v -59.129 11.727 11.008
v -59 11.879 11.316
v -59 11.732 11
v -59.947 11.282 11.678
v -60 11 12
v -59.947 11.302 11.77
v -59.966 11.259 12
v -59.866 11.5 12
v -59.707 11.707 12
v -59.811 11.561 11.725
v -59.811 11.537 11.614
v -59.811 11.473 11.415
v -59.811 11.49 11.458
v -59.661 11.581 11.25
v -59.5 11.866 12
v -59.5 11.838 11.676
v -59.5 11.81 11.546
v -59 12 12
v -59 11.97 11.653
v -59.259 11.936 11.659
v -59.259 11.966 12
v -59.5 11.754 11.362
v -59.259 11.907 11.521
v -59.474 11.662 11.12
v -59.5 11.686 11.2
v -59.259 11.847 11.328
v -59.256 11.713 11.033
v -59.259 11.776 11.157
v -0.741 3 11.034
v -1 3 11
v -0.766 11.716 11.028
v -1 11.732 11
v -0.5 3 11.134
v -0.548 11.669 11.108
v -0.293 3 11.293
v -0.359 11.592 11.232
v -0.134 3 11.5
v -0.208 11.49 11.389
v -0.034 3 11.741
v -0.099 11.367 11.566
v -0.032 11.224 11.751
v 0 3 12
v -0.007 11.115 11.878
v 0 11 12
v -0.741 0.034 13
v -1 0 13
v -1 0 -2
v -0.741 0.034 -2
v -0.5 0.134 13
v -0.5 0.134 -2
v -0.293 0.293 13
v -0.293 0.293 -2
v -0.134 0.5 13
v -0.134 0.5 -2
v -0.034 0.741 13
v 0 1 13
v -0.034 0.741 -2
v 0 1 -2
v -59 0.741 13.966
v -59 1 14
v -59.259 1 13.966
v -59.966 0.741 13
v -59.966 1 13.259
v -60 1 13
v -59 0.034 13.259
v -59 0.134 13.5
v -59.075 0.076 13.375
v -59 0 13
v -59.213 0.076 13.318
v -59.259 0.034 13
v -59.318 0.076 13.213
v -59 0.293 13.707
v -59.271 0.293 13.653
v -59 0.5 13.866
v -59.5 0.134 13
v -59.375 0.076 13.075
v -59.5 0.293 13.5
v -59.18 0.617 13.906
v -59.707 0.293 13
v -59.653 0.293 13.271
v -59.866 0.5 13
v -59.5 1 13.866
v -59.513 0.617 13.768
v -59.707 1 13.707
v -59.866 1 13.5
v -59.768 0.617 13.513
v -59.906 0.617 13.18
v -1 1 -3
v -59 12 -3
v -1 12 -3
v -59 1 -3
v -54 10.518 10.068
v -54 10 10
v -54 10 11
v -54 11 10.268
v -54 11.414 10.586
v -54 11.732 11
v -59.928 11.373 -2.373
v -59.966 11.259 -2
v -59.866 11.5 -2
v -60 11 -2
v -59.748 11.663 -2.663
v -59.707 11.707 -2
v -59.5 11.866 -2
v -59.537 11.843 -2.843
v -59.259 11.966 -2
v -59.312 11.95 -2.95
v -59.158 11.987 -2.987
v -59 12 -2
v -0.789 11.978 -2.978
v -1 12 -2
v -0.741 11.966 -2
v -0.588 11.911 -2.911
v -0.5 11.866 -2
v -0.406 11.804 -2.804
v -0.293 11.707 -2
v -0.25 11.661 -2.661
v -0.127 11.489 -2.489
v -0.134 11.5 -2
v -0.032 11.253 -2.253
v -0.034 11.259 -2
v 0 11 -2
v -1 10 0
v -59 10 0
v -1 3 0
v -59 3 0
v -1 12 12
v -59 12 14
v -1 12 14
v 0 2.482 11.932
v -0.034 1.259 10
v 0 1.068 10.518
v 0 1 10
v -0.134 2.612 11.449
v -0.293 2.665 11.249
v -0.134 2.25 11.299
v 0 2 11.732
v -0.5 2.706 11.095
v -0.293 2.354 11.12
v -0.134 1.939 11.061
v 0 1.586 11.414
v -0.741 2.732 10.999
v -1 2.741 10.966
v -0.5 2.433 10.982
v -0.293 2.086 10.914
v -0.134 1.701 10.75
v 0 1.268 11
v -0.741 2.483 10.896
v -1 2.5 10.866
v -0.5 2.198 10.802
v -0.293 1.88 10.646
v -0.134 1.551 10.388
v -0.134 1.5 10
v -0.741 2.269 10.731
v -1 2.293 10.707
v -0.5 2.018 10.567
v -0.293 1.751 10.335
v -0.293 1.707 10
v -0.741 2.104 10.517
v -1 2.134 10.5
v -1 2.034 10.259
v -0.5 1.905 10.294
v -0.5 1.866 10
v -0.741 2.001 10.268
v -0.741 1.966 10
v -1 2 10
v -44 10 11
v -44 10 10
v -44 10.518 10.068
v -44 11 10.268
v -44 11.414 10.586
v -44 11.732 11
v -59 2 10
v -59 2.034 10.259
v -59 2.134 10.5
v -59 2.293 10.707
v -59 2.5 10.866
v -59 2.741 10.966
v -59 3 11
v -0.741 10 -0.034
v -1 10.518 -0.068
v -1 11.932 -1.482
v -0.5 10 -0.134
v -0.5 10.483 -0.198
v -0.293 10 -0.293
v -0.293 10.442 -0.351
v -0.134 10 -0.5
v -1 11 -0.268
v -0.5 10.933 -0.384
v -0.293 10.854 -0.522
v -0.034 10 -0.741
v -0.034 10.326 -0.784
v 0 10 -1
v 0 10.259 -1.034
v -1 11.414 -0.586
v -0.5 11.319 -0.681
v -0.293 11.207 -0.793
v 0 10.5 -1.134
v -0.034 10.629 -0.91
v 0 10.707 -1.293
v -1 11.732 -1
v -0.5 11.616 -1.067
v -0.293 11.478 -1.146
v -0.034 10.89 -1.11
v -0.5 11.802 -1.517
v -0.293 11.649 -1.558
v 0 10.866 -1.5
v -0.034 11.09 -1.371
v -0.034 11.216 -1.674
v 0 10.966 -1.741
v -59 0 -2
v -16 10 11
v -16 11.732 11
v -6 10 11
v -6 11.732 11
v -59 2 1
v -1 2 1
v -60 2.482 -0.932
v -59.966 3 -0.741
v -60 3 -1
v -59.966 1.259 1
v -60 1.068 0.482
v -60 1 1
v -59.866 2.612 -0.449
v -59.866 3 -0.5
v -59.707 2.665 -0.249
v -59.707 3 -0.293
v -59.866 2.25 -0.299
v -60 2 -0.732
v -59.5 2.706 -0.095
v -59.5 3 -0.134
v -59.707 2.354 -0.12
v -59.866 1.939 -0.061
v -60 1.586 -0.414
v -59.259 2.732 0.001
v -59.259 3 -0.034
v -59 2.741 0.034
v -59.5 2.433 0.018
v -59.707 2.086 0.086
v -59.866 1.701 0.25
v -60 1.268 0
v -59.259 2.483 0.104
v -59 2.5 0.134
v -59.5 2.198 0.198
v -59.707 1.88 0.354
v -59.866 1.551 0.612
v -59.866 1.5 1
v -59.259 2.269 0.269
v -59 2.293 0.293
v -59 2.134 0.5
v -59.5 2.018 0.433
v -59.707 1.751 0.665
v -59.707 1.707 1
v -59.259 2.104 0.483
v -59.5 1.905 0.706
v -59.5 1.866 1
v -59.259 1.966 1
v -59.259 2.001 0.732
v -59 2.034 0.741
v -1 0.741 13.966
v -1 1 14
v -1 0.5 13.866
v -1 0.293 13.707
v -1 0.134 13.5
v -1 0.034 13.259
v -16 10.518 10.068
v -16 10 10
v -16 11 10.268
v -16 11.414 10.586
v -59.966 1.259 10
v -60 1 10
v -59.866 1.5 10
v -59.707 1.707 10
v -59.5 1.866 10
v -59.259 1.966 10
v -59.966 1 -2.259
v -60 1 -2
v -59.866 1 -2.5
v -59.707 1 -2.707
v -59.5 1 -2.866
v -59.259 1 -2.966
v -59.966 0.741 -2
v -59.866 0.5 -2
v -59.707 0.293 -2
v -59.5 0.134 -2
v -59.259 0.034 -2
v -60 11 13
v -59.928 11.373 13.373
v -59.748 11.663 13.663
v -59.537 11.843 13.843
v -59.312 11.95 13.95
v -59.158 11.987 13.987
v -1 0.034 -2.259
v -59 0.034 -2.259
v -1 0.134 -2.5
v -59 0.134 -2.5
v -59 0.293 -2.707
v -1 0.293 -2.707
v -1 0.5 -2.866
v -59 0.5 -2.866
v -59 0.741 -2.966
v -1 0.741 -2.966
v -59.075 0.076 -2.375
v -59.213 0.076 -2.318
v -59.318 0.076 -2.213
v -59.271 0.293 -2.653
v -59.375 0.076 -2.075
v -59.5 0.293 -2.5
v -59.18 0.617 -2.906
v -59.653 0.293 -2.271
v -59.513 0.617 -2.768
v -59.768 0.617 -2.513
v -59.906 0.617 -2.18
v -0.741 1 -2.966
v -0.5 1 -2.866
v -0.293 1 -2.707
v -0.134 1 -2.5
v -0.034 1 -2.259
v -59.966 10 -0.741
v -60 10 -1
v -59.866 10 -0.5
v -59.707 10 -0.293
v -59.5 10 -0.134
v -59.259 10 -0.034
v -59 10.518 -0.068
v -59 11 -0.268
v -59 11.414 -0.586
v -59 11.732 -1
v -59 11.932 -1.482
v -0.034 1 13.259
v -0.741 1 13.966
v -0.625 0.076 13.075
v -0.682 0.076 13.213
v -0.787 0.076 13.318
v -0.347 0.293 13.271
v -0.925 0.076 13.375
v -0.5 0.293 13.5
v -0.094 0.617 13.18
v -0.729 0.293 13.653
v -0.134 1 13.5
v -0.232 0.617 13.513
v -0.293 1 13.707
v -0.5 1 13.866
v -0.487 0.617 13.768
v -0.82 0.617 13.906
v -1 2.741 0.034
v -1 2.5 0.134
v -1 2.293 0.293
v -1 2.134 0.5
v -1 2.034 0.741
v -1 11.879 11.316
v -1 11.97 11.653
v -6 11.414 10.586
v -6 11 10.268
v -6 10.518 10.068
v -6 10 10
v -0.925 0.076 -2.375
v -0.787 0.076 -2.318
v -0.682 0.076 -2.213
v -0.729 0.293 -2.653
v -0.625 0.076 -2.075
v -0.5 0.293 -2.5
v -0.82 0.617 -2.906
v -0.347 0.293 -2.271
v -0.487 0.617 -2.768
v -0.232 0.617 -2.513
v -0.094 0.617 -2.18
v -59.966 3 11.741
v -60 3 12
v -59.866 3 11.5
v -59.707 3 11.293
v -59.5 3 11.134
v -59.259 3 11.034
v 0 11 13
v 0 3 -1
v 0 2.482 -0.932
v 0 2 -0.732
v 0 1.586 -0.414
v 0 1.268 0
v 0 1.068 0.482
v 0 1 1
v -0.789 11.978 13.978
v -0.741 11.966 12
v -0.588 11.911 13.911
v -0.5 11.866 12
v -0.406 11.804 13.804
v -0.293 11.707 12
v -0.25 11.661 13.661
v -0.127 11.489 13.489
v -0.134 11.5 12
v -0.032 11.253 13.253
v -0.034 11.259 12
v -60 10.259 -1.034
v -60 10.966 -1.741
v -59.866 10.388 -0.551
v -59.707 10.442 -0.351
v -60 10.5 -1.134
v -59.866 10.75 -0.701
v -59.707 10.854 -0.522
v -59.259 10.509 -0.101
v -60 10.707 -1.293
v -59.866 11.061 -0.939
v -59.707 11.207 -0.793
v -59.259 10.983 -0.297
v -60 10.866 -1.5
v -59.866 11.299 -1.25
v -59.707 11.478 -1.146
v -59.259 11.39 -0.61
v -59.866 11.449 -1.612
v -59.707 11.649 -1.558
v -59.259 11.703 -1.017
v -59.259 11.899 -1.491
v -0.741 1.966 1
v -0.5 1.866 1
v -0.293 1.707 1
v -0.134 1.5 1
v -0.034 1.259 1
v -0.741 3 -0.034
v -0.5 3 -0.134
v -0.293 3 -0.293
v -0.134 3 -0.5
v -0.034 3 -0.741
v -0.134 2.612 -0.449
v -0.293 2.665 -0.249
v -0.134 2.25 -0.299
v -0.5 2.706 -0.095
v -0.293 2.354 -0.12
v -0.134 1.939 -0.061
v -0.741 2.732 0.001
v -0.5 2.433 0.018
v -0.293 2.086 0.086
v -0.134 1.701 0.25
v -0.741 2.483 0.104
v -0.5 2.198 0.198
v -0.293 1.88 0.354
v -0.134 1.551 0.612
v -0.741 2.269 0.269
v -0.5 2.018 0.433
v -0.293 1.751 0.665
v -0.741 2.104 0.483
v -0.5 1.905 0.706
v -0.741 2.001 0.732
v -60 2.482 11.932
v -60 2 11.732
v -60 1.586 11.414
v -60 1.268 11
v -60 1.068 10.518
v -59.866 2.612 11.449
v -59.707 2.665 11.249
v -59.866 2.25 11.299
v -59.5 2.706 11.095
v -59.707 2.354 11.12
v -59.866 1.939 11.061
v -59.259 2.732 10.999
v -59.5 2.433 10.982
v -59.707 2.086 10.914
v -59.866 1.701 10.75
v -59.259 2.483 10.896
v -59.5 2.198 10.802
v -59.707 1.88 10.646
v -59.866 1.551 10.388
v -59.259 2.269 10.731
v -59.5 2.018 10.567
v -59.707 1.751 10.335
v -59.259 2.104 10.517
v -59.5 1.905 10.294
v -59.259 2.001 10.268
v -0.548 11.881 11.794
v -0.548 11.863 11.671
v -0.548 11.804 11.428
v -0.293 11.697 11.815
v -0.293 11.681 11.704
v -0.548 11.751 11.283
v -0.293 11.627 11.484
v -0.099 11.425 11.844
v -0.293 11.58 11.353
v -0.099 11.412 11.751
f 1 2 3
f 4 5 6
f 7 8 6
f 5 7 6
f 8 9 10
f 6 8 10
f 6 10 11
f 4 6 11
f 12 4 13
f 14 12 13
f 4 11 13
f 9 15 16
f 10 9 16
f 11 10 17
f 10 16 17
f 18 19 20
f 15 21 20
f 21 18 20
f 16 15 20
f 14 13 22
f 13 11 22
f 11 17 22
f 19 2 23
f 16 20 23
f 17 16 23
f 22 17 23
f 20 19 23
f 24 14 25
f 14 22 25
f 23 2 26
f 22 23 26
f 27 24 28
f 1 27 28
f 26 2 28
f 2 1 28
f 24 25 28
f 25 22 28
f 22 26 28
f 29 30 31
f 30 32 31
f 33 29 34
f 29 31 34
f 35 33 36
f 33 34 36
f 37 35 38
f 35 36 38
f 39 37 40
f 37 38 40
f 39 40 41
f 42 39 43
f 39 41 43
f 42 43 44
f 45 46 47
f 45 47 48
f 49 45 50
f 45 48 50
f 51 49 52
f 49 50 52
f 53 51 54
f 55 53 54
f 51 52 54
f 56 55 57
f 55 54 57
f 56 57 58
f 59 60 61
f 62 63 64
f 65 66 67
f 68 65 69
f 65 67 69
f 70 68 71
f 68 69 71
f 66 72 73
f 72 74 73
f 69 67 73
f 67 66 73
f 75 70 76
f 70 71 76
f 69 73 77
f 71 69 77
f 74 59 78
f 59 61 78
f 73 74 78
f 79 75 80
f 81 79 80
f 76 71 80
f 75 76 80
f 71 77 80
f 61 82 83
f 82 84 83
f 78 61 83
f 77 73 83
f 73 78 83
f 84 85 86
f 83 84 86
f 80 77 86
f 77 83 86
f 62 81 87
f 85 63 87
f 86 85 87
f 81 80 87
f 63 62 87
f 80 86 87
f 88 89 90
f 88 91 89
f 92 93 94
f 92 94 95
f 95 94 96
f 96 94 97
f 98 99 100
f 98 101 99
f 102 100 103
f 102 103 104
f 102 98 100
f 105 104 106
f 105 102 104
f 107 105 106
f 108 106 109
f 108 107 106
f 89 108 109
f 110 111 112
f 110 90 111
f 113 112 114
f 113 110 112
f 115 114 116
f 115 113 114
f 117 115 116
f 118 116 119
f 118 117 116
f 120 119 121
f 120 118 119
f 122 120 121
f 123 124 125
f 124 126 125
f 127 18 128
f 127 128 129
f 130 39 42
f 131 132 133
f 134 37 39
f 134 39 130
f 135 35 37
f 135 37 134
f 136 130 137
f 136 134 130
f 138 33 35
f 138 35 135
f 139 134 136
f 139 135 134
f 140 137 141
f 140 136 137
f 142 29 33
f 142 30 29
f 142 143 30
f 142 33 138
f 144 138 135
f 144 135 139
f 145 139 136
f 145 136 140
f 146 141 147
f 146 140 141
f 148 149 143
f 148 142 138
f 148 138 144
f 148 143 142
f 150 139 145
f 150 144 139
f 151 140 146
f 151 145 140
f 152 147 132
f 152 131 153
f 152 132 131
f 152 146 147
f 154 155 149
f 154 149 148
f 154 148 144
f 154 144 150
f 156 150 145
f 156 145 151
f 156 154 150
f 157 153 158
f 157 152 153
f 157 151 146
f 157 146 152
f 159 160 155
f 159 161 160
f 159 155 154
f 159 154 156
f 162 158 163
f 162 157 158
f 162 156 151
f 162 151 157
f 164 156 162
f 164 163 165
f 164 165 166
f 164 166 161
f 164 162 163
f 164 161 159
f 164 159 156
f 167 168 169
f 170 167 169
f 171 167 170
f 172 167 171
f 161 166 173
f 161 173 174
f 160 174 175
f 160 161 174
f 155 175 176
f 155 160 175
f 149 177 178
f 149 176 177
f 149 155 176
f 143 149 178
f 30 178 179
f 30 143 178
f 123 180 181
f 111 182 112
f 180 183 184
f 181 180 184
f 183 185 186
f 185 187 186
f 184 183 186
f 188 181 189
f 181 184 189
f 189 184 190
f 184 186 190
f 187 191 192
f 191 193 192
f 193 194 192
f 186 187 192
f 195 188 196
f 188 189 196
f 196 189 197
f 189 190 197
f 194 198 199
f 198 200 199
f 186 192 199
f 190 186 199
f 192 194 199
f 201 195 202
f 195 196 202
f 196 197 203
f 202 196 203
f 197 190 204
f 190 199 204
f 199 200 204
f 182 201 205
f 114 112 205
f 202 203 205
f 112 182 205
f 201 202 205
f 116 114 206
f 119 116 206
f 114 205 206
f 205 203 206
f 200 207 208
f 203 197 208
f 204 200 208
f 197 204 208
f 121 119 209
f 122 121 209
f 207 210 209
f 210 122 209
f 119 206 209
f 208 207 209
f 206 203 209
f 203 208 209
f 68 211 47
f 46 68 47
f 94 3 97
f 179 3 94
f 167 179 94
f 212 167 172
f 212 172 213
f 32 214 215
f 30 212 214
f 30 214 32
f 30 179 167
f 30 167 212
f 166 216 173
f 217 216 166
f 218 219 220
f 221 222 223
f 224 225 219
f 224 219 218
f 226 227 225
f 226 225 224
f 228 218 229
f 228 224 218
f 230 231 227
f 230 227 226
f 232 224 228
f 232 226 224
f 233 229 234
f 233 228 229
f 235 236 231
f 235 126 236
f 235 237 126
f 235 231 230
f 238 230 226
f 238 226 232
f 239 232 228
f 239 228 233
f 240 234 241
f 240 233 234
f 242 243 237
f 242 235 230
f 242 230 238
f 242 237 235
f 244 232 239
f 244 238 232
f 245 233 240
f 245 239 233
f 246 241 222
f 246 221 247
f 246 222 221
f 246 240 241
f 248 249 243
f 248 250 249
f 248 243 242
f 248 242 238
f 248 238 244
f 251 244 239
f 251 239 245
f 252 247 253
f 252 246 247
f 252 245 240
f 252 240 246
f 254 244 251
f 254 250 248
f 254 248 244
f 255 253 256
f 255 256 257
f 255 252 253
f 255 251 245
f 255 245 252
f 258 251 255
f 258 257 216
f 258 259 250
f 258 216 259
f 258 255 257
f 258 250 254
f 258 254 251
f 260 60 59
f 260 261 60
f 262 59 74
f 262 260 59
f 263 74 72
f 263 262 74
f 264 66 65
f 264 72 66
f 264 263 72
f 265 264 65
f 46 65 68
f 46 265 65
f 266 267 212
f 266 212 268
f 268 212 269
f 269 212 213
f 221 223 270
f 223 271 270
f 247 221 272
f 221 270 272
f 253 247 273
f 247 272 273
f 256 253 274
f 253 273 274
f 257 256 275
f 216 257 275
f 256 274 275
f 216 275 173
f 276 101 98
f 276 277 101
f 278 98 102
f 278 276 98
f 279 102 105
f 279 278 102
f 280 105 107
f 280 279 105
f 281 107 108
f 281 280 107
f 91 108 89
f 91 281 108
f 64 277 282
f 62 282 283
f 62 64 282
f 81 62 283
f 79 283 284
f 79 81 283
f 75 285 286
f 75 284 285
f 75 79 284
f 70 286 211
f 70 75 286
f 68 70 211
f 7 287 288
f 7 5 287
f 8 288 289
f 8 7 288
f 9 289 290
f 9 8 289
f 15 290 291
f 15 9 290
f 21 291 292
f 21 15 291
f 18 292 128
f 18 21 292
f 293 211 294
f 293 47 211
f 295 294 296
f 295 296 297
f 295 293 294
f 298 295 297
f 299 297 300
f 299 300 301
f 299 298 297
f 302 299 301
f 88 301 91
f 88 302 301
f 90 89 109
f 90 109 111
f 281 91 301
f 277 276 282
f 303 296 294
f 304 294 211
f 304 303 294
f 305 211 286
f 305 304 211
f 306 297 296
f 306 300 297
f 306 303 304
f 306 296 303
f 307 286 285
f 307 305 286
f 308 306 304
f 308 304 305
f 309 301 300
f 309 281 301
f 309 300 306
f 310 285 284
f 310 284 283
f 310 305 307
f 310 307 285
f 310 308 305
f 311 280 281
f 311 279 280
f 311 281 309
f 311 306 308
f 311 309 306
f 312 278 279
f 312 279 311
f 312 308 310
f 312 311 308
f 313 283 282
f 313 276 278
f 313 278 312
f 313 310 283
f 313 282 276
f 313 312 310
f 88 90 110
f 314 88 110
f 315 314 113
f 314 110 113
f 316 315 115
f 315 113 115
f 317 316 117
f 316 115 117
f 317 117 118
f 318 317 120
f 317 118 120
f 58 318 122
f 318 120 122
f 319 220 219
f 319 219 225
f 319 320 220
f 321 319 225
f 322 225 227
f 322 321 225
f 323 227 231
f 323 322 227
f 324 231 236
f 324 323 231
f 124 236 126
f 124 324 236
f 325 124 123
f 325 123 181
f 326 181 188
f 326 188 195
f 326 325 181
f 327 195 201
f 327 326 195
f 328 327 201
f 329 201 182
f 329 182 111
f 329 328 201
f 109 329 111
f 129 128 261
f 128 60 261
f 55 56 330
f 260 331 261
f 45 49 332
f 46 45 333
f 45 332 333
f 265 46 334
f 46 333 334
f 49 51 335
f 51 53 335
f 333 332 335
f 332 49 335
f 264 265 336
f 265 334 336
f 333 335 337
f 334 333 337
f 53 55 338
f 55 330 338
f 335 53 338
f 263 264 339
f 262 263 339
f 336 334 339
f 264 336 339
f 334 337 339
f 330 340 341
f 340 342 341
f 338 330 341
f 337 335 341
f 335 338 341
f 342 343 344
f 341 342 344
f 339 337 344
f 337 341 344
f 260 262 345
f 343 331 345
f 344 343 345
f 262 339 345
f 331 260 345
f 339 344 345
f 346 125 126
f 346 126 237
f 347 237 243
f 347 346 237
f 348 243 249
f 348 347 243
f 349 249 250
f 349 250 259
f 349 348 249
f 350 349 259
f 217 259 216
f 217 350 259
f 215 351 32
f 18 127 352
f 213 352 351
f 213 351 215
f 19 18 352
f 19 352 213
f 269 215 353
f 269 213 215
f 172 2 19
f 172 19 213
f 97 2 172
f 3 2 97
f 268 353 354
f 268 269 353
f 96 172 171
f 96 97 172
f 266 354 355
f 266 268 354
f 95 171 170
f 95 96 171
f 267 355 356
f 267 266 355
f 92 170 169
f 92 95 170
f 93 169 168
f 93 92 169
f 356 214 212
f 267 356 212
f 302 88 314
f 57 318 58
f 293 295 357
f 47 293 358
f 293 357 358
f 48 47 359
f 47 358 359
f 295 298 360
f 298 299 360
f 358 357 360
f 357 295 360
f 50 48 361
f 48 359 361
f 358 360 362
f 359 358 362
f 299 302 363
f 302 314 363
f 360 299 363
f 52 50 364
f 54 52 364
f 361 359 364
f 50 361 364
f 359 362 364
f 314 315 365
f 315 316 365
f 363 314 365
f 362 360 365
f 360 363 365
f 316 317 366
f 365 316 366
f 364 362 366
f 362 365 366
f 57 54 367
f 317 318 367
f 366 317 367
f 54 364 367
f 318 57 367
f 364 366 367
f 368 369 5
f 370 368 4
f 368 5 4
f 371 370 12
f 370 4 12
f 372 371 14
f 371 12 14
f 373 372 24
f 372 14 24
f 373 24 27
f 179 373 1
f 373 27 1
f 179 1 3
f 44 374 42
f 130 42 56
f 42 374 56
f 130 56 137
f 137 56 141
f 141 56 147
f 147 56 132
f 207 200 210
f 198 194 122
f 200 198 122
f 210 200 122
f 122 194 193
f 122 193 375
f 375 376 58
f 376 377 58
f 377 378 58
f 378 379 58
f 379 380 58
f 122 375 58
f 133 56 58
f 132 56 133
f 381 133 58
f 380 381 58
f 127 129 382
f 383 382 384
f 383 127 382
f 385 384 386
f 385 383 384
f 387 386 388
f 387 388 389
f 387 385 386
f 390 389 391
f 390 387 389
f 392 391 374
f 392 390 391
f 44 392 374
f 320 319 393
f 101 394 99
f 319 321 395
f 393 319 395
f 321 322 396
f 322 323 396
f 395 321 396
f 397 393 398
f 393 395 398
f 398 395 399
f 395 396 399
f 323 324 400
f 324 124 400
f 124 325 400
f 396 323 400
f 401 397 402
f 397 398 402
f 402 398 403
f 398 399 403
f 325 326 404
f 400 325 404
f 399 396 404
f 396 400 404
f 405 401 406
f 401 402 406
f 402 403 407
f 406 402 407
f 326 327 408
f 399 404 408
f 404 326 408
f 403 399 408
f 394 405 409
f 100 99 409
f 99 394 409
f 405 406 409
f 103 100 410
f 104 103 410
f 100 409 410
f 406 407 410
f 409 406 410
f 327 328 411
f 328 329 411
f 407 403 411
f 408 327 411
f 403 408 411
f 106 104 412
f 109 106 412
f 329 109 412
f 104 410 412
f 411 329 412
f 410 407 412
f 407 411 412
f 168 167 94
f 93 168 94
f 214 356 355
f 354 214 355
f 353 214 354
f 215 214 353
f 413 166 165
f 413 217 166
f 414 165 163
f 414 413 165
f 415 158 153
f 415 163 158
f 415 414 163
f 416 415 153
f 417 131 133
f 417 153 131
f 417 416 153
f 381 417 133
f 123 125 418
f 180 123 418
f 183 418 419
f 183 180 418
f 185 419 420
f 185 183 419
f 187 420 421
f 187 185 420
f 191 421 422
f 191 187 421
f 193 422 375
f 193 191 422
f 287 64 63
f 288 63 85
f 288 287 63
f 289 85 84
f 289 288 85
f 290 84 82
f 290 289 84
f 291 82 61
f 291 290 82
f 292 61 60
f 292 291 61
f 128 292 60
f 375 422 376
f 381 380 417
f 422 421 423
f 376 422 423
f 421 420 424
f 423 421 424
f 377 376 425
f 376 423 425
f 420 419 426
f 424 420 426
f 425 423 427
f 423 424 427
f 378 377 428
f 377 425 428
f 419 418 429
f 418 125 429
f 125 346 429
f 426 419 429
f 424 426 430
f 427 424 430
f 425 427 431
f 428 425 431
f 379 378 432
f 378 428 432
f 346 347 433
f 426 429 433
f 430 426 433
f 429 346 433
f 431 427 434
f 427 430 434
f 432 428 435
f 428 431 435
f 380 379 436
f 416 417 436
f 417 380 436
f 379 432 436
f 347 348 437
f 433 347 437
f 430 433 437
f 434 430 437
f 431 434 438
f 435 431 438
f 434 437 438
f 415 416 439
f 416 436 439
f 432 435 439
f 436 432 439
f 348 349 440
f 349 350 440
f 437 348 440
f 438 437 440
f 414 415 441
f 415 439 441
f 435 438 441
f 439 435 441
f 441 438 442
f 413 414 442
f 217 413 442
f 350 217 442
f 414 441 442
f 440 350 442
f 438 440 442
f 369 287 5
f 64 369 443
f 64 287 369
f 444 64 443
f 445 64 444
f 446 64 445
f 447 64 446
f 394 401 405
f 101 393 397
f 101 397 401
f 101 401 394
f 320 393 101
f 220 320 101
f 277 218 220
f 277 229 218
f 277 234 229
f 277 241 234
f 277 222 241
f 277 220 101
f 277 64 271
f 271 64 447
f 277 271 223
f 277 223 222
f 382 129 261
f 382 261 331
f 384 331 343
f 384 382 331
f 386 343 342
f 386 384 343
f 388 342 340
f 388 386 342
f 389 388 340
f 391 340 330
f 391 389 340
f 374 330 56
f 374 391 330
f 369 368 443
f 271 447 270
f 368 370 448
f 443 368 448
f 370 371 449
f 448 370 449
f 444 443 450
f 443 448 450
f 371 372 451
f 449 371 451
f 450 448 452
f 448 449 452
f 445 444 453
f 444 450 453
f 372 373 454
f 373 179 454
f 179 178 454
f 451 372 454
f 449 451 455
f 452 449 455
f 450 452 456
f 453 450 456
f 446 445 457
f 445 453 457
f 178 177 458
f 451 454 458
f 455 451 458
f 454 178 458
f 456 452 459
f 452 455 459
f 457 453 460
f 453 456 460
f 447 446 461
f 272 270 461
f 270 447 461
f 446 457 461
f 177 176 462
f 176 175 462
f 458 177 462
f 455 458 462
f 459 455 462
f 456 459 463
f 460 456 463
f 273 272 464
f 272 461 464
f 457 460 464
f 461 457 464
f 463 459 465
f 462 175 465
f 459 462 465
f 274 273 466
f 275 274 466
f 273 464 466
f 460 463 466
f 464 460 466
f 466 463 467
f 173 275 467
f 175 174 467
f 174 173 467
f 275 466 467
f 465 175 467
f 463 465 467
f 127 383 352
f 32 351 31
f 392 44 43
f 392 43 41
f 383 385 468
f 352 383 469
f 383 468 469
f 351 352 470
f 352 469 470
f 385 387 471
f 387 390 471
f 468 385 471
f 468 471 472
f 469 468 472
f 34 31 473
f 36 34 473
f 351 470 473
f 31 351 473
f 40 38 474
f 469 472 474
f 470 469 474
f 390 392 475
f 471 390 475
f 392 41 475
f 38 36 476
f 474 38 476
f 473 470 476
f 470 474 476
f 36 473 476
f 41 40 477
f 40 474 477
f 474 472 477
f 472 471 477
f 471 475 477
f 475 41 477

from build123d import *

# Parameters (mm, degrees)
SKETCH2_W           = 60
SKETCH2_H           = 3
SKETCH2_H_2         = 11
BOSS_EXTRUDE2_DEPTH = 2
SKETCH3_W           = 60
SKETCH3_H           = 3
BOSS_EXTRUDE3_DEPTH = 10
SKETCH4_W           = 10
SKETCH4_H           = 2
BOSS_EXTRUDE4_DEPTH = 1
FILLET1_START       = -61
FILLET1_DEPTH       = 62
FILLET2_R           = 1


with BuildPart() as part:
    # Sketch2 → Boss-Extrude2 (new body)
    with BuildSketch(Plane(origin=(0, 0, 0), x_dir=(1, 0, 0), z_dir=(0, 1, 0))):
        with Locations((-30, 1.5)):
            Rectangle(SKETCH2_W, SKETCH2_H)
        with Locations((-30, -5.5)):
            Rectangle(SKETCH2_W, SKETCH2_H_2)
        with Locations((-30, -12.5)):
            Rectangle(SKETCH2_W, SKETCH2_H)
    extrude(amount=BOSS_EXTRUDE2_DEPTH)

    # Sketch3 → Boss-Extrude3 (add)
    with BuildSketch(Plane(origin=(0, 2, 0), x_dir=(1, 0, 0), z_dir=(0, 1, 0))):
        with Locations((-30, -12.5)):
            Rectangle(SKETCH3_W, SKETCH3_H)
        with Locations((-30, 1.5)):
            Rectangle(SKETCH3_W, SKETCH3_H)
    extrude(amount=BOSS_EXTRUDE3_DEPTH)

    # Sketch4 → Boss-Extrude4 (add)
    with BuildSketch(Plane(origin=(0, 0, 11), x_dir=(-1, 0, 0), z_dir=(0, 0, -1))):
        with Locations((49, 11)):
            Rectangle(SKETCH4_W, SKETCH4_H)
        with Locations((11, 11)):
            Rectangle(SKETCH4_W, SKETCH4_H)
    extrude(amount=BOSS_EXTRUDE4_DEPTH)

    # Fillet1: read off the stored shape, not the designer's step
    # Fillet1 outline → Fillet1 (cut)
    with BuildSketch(Plane.YZ.offset(FILLET1_START)):
        with BuildLine():
            Line((12, 0), (10, 0))
            ThreePointArc((10, 0), (11.414213562, -0.585786438), (12, -2))
            Line((12, -2), (12, 0))
        make_face()
        with BuildLine():
            ThreePointArc((12, 12), (11.414213562, 10.585786438), (10, 10))
            Line((10, 10), (12, 10))
            Line((12, 10), (12, 12))
        make_face()
    extrude(amount=FILLET1_DEPTH, mode=Mode.SUBTRACT)

    # Fillet2
    fillet2_edges = [part.edges().sort_by_distance(p)[0] for p in [
        (-60, 6, -3),
        (0, 6, -3),
        (0, 6, 14),
        (-60, 6, 14),
        (-60, 2, 5.5),
        (0, 2, 5.5),
        (0, 12, 13),
        (-30, 2, 11),
        (-30, 2, 0),
        (-60, 12, -2.5),
        (-30, 0, -3),
        (0, 0, 5.5),
        (0, 12, -2.5),
        (0, 6, 0),
        (0, 6.866025404, 11),
        (0, 11.931851652, 11.48236191),
        (0, 11.414213562, -0.585786438),
        (-60, 6, 0),
        (-30, 0, 14),
        (-60, 12, 13),
        (-60, 6.866025404, 11),
        (-60, 11.931851652, 11.48236191),
        (-60, 11.414213562, -0.585786438),
        (-60, 0, 5.5),
    ]]
    fillet(fillet2_edges, radius=FILLET2_R - 0.0001)  # a hair under: the kernel refuses the full size


solid = part.part
